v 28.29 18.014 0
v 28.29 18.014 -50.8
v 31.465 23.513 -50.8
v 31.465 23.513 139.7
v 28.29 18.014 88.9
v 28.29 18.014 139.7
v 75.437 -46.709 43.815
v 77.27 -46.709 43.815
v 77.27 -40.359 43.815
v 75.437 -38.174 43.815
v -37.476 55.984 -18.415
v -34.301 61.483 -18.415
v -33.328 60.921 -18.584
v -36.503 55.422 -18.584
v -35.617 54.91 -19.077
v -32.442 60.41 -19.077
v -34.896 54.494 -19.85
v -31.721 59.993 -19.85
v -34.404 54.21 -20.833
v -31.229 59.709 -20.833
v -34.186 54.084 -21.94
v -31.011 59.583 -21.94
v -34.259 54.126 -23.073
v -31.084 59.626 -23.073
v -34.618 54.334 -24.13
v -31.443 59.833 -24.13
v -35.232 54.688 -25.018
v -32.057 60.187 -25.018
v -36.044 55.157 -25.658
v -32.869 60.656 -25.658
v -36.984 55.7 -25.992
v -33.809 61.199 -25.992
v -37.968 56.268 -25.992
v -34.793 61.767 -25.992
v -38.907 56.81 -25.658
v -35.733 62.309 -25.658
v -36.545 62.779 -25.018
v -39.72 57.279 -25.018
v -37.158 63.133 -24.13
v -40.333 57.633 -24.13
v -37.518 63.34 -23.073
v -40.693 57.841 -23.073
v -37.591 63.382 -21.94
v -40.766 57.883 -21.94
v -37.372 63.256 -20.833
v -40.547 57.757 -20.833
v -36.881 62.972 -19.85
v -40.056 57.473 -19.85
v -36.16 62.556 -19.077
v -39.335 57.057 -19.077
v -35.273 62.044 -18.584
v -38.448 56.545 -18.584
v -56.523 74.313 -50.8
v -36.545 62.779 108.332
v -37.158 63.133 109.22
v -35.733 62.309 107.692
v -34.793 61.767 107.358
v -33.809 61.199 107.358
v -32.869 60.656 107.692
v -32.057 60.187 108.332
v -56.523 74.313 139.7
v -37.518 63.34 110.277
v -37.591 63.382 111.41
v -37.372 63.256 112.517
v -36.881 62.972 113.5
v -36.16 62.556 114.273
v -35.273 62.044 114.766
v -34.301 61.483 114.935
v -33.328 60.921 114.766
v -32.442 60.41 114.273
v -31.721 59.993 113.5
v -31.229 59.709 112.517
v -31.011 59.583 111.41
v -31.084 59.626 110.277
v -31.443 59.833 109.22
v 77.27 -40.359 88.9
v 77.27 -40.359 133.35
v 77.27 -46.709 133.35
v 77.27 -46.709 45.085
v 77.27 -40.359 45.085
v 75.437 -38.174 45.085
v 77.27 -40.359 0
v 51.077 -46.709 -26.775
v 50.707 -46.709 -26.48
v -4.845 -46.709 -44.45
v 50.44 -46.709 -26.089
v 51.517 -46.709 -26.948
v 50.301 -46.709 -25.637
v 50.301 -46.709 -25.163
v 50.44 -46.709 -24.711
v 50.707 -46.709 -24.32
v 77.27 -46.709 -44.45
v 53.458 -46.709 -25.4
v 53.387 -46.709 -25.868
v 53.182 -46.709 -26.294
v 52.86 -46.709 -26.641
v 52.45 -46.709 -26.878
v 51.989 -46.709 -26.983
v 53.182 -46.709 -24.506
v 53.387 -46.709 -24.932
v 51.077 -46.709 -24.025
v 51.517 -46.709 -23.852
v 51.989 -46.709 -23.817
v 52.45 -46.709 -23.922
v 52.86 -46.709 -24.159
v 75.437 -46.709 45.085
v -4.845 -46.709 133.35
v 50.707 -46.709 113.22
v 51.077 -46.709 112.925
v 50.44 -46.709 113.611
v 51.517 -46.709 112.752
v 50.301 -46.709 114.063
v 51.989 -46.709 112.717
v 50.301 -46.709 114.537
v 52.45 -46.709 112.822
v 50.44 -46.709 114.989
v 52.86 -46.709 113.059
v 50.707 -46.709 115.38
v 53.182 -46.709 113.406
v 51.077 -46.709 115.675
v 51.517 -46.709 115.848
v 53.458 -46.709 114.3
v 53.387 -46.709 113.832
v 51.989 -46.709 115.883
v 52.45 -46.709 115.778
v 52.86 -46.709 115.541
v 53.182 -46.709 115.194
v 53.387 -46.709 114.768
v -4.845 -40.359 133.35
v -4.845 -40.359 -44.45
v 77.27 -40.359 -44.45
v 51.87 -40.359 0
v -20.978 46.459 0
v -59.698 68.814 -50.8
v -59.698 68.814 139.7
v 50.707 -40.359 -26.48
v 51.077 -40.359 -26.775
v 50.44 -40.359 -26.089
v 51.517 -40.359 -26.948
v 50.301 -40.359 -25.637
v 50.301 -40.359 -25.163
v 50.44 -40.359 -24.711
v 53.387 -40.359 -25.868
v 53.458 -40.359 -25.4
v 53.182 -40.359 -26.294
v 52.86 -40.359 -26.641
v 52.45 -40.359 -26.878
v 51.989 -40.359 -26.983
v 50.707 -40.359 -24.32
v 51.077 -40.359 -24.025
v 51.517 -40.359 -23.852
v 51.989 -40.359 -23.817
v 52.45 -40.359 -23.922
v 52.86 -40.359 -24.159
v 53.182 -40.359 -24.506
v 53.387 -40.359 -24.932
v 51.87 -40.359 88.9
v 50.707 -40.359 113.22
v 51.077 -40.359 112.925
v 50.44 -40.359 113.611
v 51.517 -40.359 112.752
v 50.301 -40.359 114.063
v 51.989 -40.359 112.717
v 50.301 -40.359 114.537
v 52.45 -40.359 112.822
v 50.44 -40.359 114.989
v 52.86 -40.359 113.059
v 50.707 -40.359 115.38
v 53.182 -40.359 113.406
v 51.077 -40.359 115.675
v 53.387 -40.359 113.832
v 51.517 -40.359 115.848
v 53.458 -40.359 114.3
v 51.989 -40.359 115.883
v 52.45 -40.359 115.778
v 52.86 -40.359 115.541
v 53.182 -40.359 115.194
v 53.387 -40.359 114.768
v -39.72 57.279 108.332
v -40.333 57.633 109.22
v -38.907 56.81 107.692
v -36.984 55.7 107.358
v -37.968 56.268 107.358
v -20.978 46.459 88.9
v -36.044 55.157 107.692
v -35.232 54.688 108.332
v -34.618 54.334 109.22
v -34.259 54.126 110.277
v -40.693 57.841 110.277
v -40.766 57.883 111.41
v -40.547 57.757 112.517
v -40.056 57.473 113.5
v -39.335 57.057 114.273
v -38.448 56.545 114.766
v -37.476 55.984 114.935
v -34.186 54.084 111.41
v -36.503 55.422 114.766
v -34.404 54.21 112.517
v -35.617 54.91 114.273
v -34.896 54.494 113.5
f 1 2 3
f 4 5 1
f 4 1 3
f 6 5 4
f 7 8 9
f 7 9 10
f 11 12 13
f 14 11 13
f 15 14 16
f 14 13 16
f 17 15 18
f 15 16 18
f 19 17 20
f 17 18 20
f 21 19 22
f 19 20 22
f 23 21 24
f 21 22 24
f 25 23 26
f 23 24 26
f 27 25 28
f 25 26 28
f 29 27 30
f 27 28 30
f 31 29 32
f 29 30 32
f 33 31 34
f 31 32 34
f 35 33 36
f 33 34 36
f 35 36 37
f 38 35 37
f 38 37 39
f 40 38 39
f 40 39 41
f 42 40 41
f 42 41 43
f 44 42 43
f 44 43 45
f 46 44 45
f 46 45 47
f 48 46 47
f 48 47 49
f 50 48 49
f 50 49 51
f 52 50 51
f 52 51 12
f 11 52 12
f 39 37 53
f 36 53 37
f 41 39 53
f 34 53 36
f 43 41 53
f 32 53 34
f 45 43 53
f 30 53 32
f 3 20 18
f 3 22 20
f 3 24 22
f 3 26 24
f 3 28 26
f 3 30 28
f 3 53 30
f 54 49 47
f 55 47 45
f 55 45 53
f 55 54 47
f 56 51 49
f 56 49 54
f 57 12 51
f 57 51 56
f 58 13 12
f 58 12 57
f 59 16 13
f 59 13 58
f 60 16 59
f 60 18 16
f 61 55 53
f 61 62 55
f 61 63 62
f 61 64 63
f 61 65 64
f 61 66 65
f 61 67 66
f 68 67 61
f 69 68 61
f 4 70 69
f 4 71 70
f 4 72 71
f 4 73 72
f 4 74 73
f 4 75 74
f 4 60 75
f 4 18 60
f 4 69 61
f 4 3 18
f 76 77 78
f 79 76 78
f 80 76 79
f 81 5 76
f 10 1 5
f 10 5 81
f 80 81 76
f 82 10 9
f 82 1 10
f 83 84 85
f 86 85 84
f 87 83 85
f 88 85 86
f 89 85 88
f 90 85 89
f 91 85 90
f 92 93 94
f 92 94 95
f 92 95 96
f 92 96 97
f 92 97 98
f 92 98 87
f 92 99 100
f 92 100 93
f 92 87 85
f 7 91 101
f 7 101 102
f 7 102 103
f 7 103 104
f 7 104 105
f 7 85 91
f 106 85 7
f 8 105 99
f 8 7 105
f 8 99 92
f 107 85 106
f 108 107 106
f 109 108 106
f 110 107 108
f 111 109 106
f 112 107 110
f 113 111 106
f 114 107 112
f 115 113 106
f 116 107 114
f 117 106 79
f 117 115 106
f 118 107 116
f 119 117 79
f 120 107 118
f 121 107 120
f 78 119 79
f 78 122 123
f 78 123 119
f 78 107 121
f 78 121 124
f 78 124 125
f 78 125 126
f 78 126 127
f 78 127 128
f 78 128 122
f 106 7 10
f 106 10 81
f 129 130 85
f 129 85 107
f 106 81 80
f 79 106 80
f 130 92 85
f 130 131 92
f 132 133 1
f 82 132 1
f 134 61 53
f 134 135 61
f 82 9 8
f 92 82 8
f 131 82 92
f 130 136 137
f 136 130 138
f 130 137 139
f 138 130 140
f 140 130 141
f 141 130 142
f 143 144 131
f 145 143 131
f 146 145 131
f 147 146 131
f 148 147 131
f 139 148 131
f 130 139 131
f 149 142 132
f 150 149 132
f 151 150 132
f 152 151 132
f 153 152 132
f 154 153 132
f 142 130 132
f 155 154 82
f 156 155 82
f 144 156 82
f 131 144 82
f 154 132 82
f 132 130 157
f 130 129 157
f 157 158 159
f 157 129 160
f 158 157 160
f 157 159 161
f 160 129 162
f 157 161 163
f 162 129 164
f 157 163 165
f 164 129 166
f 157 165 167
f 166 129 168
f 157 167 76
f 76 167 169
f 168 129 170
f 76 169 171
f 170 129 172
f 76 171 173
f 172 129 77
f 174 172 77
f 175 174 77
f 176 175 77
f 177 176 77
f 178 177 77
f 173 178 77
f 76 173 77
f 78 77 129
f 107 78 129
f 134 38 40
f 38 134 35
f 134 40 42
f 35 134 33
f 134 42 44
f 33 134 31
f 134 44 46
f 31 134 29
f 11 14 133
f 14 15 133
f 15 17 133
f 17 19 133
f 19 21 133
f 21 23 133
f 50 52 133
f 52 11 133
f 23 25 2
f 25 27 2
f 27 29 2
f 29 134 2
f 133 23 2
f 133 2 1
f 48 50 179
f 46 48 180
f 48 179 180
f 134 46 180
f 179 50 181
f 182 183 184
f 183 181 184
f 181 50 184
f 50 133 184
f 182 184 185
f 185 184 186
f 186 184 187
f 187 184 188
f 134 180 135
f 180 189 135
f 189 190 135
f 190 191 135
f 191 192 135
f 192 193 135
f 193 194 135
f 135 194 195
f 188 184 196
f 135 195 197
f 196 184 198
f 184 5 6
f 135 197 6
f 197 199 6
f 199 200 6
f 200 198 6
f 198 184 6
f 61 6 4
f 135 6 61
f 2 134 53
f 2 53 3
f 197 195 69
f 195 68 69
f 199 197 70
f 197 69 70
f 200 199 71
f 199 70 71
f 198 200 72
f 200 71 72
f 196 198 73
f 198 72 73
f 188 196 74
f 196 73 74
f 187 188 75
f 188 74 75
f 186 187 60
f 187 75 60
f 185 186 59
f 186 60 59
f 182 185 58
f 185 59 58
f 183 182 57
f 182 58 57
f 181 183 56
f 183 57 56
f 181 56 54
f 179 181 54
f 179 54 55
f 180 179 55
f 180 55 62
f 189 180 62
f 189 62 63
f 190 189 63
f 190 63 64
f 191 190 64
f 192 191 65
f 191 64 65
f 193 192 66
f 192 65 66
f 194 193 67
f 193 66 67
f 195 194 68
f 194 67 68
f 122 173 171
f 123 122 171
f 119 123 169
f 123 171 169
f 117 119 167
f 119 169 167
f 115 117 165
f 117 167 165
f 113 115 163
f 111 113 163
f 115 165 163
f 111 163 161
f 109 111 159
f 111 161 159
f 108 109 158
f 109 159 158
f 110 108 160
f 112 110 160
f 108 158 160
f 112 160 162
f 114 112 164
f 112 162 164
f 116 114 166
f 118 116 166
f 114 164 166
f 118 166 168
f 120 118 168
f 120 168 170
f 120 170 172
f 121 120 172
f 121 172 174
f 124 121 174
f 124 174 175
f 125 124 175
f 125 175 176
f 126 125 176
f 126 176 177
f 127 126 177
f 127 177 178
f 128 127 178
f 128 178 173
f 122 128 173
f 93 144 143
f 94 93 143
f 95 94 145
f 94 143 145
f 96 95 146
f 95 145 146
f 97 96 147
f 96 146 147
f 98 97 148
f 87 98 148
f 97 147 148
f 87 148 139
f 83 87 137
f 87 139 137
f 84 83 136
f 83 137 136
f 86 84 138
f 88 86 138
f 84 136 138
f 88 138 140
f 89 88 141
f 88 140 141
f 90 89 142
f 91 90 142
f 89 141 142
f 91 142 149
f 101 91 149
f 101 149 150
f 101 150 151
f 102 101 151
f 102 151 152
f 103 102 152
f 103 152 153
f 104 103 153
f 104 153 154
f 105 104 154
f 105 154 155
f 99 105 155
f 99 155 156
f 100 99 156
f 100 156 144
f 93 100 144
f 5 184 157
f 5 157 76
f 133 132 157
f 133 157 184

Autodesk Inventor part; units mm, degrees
ref_plane "YZ Plane" through (0, 0, 0) normal (1, 0, 0) x (0, 1, 0)
ref_plane "XZ Plane" through (0, 0, 0) normal (0, 1, 0) x (-1, 0, 0)
ref_plane "XY Plane" through (0, 0, 0) normal (0, 0, 1) x (1, 0, 0)
sketch "Sketch1" plane through (0, 0, 0) normal (0, 0, 1) x (1, 0, 0)
  line L0 (28.2901, 18.0136) -> (77.2705, -40.359)
  line L1 (77.2705, -40.359) -> (51.8705, -40.359)
  line L2 (51.8705, -40.359) -> (-20.9781, 46.4586)
  line L3 (-20.9781, 46.4586) -> (28.2901, 18.0136)
  point P0 (0, 0)
  point P1 (3.656, 32.2361)
  dimension "d0" = 76.2
  dimension "d2" = 25.4
  dimension "d34" = 130
  dimension "d35" = 160
extrude "Extrusion1" add sketch "Sketch1" along normal blind 88.9
sketch "Sketch2" plane through (-20.9781, 46.4586, 0) normal (0.5, 0.8660254, 0) x (0, 0, 1)
  line L0 (0, 0) -> (0, 56.89) projected
  line L1 (-50.8, 56.89) -> (139.7, 56.89)
  line L2 (139.7, 56.89) -> (139.7, -44.71)
  line L3 (139.7, -44.71) -> (-50.8, -44.71)
  line L4 (-50.8, -44.71) -> (-50.8, 56.89)
  line L5 (0, 56.89) -> (88.9, 56.89) projected
  point P0 (0, 41.3969)
  point P1 (44.45, 19.4575)
  dimension "d6" = 190.5
  dimension "d8" = 95.25
  dimension "d9" = 101.6
  dimension "d10" = 44.45
  dimension "d11" = 88.9
  dimension "d12" = 56.89
  dimension "d45" = 0
extrude "Extrusion2" add sketch "Sketch2" along normal blind 6.35
sketch "Sketch3" plane through (-17.8031, 51.9578, 0) normal (0.5, 0.8660254, 0) x (0, 0, 1)
  line L0 (139.7, 56.89) -> (-50.8, 56.89) projected
  circle A0 centre (-22.225, -19.05) radius 3.81
  circle A1 centre (111.125, -19.05) radius 3.81
  line L1 (-50.8, -44.71) -> (139.7, -44.71) projected
  line L2 (44.45, -44.71) -> (44.45, 56.89)
  line L3 (0, 0) -> (88.9, 0) projected
  point P0 (0, 41.3969)
  dimension "d17" = 7.62
  dimension "d18" = 7.62
  dimension "d19" = 0
  dimension "d46" = 133.35
  dimension "d47" = 66.675
  dimension "d86" = 19.05
extrude "Extrusion3" cut sketch "Sketch3" against normal up to next
sketch "Sketch6" plane through (-17.8031, 51.9578, 0) normal (0.5, 0.8660254, 0) x (0.8660254, -0.5, 0)
  circle A0 centre (-19.05, 22.225) radius 3.81 projected
  circle A1 centre (-19.05, -111.125) radius 3.81 projected
  line L0 (6.35, 34.925) -> (-44.45, 34.925)
  line L1 (-44.45, 34.925) -> (-44.45, -15.875)
  line L2 (-44.45, -15.875) -> (6.35, -15.875)
  line L3 (6.35, -15.875) -> (6.35, 34.925)
  line L4 (6.35, -73.025) -> (-44.45, -73.025)
  line L5 (-44.45, -73.025) -> (-44.45, -123.825)
  line L6 (-44.45, -123.825) -> (6.35, -123.825)
  line L7 (6.35, -123.825) -> (6.35, -73.025)
  point P0 (41.3969, 0)
  dimension "d52" = 50.8
  dimension "d60" = 25.4
  dimension "d61" = 25.4
  dimension "d62" = 50.8
  dimension "d63" = 12.7
  dimension "d64" = 12.7
extrude "Extrusion5" [suppressed]
sketch "Sketch7" plane through (-18.1206, 51.4079, 0) normal (0.5, 0.8660254, 0) x (0.8660254, -0.5, 0)
  line L0 (6.35, 38.1) -> (-44.45, 38.1) projected
  line L1 (6.35, -76.2) -> (-44.45, -76.2) projected
  line L2 (-44.45, -76.2) -> (-44.45, -127) projected
  line L3 (-44.45, -127) -> (6.35, -127) projected
  line L4 (6.35, -127) -> (6.35, -76.2) projected
  line L5 (-44.45, -12.7) -> (-39.2324, -12.7)
  line L6 (-39.2324, -12.7) -> (-39.2324, 38.1)
  line L7 (-39.2324, 38.1) -> (-44.45, 38.1)
  line L8 (-44.45, 38.1) -> (-44.45, -12.7)
  line L9 (-44.45, -127) -> (-39.2324, -127)
  line L10 (-39.2324, -127) -> (-39.2324, -76.2)
  line L11 (-39.2324, -76.2) -> (-44.45, -76.2)
  line L12 (-44.45, -76.2) -> (-44.45, -127)
  point P0 (41.3969, 0)
  dimension "d56" = 5.2176
  dimension "d57" = 5.2176
extrude "Extrusion6" [suppressed]
sketch "Sketch13" plane through (-57.8855, 71.4332, -38.1) normal (-0.8660254, 0.5, 0) x (0, 0, 1)
  line L0 (0, 0) -> (0, 2.54) projected
  circle A0 centre (25.4, 39.096) radius 3.175
  circle A1 centre (139.7, 39.096) radius 3.175
  line L1 (114.3, 0) -> (114.3, 2.54) projected
  point P0 (50.8, 53.34)
  point P1 (0, 53.34)
  point P2 (38.1, -32.9202)
  point P3 (114.3, 53.34)
  dimension "d98" = 6.35
  dimension "d99" = 0
  dimension "d100" = 25.4
  dimension "d101" = 50.8
  dimension "d102" = 25.4
extrude "Extrusion11" [suppressed]
sketch "Sketch14" plane through (-57.8855, 71.4332, -38.1) normal (-0.8660254, 0.5, 0) x (0, 0, 1)
  circle A0 centre (25.4, 39.096) radius 3.175 projected
  line L0 (-107.95, 213.721) -> (273.05, 213.721)
  line L1 (273.05, 213.721) -> (273.05, -14.879)
  line L2 (273.05, -14.879) -> (-107.95, -14.879)
  line L3 (-107.95, -14.879) -> (-107.95, 213.721)
  point P0 (38.1, -32.9202)
  dimension "d107" = 381
  dimension "d109" = 228.6
  dimension "d110" = 133.35
  dimension "d111" = 53.975
extrude "Extrusion12" [suppressed]
sketch "Sketch18" plane through (-57.8855, 71.4332, -38.1) normal (0.8660254, -0.5, 0) x (0, 0, -1)
  line L0 (-273.05, -14.879) -> (107.95, -14.879) projected
  line L1 (-273.05, 213.721) -> (-195.9898, 213.721)
  line L2 (-195.9898, 213.721) -> (-195.9898, -14.879)
  line L3 (-195.9898, -14.879) -> (-273.05, -14.879)
  line L4 (-273.05, -14.879) -> (-273.05, 213.721)
  line L5 (107.95, 213.721) -> (30.8898, 213.721)
  line L6 (30.8898, 213.721) -> (30.8898, -14.879)
  line L7 (30.8898, -14.879) -> (107.95, -14.879)
  line L8 (107.95, -14.879) -> (107.95, 213.721)
  point P0 (-38.1, -32.9202)
extrude "Extrusion14" [suppressed]
sketch "Sketch15" plane through (0, 0, 0) normal (0, 0, 1) x (1, 0, 0)
  line L0 (15.9795, 275.571) -> (4.9809, 281.921) projected
  line L1 (-109.3191, 83.9476) -> (4.9809, 281.921) projected
  line L2 (-98.3205, 77.5976) -> (-109.3191, 83.9476) projected
  line L3 (77.2705, -40.359) -> (28.2901, 18.0136) projected
  line L4 (28.2901, 18.0136) -> (-20.9781, 46.4586) projected
  line L5 (-20.9781, 46.4586) -> (51.8705, -40.359) projected
  line L6 (51.8705, -40.359) -> (77.2705, -40.359) projected
  line L7 (77.2705, -40.359) -> (-405.3295, -40.359)
  line L8 (77.2705, -40.359) -> (204.2705, -40.359)
  line L9 (-98.3205, 77.5976) -> (15.9795, 275.571) projected
  point P0 (0, 0)
  point P1 (-65.325, 58.5476)
  point P2 (48.975, 256.521)
  dimension "d125" = 127
  dimension "d127" = 482.6
sketch "Sketch16" plane through (0, 0, 0) normal (0, 0, 1) x (1, 0, 0)
  line L0 (77.2705, -40.359) -> (-405.3295, -40.359) projected
  line L1 (15.9795, 275.571) -> (4.9809, 281.921) projected
  line L2 (-109.3191, 83.9476) -> (4.9809, 281.921) projected
  line L3 (-98.3205, 77.5976) -> (-109.3191, 83.9476) projected
  line L4 (77.2705, -40.359) -> (204.2705, -40.359) projected
  line L5 (-98.3205, 77.5976) -> (15.9795, 275.571) projected
  point P0 (0, 0)
  point P1 (-65.325, 58.5476)
  point P2 (51.8705, -40.359)
  point P3 (51.8705, -40.359)
  dimension "d129" = 457.2
  dimension "d130" = 322.28
  dimension "d131" = 98.9066
  dimension "d150" = 188.291
sketch "Sketch17" plane through (0, 0, 0) normal (0, 0, 1) x (1, 0, 0)
  line L0 (77.2705, -40.359) -> (-405.3295, -40.359) projected
  line L1 (-144.0325, 61.241) -> (-144.0325, -40.359)
  line L2 (-144.0325, -40.359) -> (-42.4325, -40.359)
  line L3 (-42.4325, -40.359) -> (-42.4325, 35.841)
  line L4 (-42.4325, 35.841) -> (-144.0325, 61.241)
  line L5 (77.2705, -40.359) -> (204.2705, -40.359) projected
  point P0 (0, 0)
  point P1 (-93.2325, -40.359)
  dimension "d141" = 101.6
  dimension "d142" = 101.6
  dimension "d146" = 76.2
  dimension "d147" = 297.503
  dimension "d151" = 312.097
extrude "Extrusion13" [suppressed]
sketch "Sketch19" plane through (51.8705, -40.359, 0) normal (0, -1, 0) x (1, 0, 0)
  line L0 (25.4, 0) -> (0, 0) projected
  line L1 (25.4, 0) -> (25.4, 88.9) projected
  line L2 (0, 88.9) -> (25.4, 88.9) projected
  line L3 (0, 0) -> (0, 88.9) projected
  line L4 (25.4, 88.9) -> (25.4, 133.35)
  line L5 (25.4, 133.35) -> (-56.7156, 133.35)
  line L6 (-56.7156, 133.35) -> (-56.7156, 71.7364)
  line L7 (25.4, 0) -> (25.4, -44.45)
  line L8 (25.4, -44.45) -> (-56.7156, -44.45)
  line L9 (-56.7156, -44.45) -> (-56.7156, 17.1636)
  line L10 (-56.7156, 71.7364) -> (-56.7156, 17.1636)
  point P0 (-51.8705, 0)
  dimension "d153" = 90
  dimension "d155" = 90
  dimension "d156" = 90
  dimension "d159" = 90
  dimension "d160" = 44.45
extrude "Extrusion15" add sketch "Sketch19" along normal blind 6.35
sketch "Sketch20" plane through (51.8705, -40.359, 0) normal (0, 1, 0) x (1, 0, 0)
  line L0 (25.4, 44.45) -> (25.4, 0) projected
  line L1 (-56.7156, 44.45) -> (25.4, 44.45) projected
  line L2 (25.4, -133.35) -> (-56.7156, -133.35) projected
  line L3 (25.4, -88.9) -> (25.4, -133.35) projected
  circle A0 centre (0, 25.4) radius 1.5875
  circle A1 centre (0, -114.3) radius 1.5875
  point P0 (-51.8705, 0)
  dimension "d161" = 3.175
  dimension "d162" = 19.05
  dimension "d163" = 25.4
  dimension "d164" = 19.05
  dimension "d165" = 25.4
extrude "Extrusion16" cut sketch "Sketch20" against normal blind 6.35
sketch "Sketch21" plane through (51.8705, -46.709, 0) normal (0, -1, 0) x (1, 0, 0)
  line L0 (25.4, 133.35) -> (-56.7156, 133.35) projected
  line L1 (-56.7156, -44.45) -> (25.4, -44.45) projected
  line L2 (23.5667, 45.085) -> (31.1867, 45.085)
  line L3 (31.1867, 45.085) -> (31.1867, 43.815)
  line L4 (31.1867, 43.815) -> (23.5667, 43.815)
  line L5 (23.5667, 43.815) -> (23.5667, 45.085)
  point P0 (-51.8705, 0)
  dimension "d168" = 1.27
  dimension "d170" = 177.8
  dimension "d171" = 88.265
  dimension "d172" = 7.62
extrude "Extrusion17" cut sketch "Sketch21" against normal blind 25.4
equation "\"d8\" = 0.5 * d6"
equation "\"d10\" = 0.5 * d11"
equation "\"d18\" = d17"
equation "\"d47\" = 0.5 * d46"
equation "\"d61\" = d60"
equation "\"d64\" = d63"
equation "\"d57\" = d56"
equation "\"d100\" = 0.5 * d101"
equation "\"d102\" = d100"
equation "\"d156\" = d155"
equation "\"d164\" = d162"
equation "\"d165\" = d163"
equation "\"d171\" = 0.5 * d170 - 0.5 * d168"
properties part number "Problem Solving"
